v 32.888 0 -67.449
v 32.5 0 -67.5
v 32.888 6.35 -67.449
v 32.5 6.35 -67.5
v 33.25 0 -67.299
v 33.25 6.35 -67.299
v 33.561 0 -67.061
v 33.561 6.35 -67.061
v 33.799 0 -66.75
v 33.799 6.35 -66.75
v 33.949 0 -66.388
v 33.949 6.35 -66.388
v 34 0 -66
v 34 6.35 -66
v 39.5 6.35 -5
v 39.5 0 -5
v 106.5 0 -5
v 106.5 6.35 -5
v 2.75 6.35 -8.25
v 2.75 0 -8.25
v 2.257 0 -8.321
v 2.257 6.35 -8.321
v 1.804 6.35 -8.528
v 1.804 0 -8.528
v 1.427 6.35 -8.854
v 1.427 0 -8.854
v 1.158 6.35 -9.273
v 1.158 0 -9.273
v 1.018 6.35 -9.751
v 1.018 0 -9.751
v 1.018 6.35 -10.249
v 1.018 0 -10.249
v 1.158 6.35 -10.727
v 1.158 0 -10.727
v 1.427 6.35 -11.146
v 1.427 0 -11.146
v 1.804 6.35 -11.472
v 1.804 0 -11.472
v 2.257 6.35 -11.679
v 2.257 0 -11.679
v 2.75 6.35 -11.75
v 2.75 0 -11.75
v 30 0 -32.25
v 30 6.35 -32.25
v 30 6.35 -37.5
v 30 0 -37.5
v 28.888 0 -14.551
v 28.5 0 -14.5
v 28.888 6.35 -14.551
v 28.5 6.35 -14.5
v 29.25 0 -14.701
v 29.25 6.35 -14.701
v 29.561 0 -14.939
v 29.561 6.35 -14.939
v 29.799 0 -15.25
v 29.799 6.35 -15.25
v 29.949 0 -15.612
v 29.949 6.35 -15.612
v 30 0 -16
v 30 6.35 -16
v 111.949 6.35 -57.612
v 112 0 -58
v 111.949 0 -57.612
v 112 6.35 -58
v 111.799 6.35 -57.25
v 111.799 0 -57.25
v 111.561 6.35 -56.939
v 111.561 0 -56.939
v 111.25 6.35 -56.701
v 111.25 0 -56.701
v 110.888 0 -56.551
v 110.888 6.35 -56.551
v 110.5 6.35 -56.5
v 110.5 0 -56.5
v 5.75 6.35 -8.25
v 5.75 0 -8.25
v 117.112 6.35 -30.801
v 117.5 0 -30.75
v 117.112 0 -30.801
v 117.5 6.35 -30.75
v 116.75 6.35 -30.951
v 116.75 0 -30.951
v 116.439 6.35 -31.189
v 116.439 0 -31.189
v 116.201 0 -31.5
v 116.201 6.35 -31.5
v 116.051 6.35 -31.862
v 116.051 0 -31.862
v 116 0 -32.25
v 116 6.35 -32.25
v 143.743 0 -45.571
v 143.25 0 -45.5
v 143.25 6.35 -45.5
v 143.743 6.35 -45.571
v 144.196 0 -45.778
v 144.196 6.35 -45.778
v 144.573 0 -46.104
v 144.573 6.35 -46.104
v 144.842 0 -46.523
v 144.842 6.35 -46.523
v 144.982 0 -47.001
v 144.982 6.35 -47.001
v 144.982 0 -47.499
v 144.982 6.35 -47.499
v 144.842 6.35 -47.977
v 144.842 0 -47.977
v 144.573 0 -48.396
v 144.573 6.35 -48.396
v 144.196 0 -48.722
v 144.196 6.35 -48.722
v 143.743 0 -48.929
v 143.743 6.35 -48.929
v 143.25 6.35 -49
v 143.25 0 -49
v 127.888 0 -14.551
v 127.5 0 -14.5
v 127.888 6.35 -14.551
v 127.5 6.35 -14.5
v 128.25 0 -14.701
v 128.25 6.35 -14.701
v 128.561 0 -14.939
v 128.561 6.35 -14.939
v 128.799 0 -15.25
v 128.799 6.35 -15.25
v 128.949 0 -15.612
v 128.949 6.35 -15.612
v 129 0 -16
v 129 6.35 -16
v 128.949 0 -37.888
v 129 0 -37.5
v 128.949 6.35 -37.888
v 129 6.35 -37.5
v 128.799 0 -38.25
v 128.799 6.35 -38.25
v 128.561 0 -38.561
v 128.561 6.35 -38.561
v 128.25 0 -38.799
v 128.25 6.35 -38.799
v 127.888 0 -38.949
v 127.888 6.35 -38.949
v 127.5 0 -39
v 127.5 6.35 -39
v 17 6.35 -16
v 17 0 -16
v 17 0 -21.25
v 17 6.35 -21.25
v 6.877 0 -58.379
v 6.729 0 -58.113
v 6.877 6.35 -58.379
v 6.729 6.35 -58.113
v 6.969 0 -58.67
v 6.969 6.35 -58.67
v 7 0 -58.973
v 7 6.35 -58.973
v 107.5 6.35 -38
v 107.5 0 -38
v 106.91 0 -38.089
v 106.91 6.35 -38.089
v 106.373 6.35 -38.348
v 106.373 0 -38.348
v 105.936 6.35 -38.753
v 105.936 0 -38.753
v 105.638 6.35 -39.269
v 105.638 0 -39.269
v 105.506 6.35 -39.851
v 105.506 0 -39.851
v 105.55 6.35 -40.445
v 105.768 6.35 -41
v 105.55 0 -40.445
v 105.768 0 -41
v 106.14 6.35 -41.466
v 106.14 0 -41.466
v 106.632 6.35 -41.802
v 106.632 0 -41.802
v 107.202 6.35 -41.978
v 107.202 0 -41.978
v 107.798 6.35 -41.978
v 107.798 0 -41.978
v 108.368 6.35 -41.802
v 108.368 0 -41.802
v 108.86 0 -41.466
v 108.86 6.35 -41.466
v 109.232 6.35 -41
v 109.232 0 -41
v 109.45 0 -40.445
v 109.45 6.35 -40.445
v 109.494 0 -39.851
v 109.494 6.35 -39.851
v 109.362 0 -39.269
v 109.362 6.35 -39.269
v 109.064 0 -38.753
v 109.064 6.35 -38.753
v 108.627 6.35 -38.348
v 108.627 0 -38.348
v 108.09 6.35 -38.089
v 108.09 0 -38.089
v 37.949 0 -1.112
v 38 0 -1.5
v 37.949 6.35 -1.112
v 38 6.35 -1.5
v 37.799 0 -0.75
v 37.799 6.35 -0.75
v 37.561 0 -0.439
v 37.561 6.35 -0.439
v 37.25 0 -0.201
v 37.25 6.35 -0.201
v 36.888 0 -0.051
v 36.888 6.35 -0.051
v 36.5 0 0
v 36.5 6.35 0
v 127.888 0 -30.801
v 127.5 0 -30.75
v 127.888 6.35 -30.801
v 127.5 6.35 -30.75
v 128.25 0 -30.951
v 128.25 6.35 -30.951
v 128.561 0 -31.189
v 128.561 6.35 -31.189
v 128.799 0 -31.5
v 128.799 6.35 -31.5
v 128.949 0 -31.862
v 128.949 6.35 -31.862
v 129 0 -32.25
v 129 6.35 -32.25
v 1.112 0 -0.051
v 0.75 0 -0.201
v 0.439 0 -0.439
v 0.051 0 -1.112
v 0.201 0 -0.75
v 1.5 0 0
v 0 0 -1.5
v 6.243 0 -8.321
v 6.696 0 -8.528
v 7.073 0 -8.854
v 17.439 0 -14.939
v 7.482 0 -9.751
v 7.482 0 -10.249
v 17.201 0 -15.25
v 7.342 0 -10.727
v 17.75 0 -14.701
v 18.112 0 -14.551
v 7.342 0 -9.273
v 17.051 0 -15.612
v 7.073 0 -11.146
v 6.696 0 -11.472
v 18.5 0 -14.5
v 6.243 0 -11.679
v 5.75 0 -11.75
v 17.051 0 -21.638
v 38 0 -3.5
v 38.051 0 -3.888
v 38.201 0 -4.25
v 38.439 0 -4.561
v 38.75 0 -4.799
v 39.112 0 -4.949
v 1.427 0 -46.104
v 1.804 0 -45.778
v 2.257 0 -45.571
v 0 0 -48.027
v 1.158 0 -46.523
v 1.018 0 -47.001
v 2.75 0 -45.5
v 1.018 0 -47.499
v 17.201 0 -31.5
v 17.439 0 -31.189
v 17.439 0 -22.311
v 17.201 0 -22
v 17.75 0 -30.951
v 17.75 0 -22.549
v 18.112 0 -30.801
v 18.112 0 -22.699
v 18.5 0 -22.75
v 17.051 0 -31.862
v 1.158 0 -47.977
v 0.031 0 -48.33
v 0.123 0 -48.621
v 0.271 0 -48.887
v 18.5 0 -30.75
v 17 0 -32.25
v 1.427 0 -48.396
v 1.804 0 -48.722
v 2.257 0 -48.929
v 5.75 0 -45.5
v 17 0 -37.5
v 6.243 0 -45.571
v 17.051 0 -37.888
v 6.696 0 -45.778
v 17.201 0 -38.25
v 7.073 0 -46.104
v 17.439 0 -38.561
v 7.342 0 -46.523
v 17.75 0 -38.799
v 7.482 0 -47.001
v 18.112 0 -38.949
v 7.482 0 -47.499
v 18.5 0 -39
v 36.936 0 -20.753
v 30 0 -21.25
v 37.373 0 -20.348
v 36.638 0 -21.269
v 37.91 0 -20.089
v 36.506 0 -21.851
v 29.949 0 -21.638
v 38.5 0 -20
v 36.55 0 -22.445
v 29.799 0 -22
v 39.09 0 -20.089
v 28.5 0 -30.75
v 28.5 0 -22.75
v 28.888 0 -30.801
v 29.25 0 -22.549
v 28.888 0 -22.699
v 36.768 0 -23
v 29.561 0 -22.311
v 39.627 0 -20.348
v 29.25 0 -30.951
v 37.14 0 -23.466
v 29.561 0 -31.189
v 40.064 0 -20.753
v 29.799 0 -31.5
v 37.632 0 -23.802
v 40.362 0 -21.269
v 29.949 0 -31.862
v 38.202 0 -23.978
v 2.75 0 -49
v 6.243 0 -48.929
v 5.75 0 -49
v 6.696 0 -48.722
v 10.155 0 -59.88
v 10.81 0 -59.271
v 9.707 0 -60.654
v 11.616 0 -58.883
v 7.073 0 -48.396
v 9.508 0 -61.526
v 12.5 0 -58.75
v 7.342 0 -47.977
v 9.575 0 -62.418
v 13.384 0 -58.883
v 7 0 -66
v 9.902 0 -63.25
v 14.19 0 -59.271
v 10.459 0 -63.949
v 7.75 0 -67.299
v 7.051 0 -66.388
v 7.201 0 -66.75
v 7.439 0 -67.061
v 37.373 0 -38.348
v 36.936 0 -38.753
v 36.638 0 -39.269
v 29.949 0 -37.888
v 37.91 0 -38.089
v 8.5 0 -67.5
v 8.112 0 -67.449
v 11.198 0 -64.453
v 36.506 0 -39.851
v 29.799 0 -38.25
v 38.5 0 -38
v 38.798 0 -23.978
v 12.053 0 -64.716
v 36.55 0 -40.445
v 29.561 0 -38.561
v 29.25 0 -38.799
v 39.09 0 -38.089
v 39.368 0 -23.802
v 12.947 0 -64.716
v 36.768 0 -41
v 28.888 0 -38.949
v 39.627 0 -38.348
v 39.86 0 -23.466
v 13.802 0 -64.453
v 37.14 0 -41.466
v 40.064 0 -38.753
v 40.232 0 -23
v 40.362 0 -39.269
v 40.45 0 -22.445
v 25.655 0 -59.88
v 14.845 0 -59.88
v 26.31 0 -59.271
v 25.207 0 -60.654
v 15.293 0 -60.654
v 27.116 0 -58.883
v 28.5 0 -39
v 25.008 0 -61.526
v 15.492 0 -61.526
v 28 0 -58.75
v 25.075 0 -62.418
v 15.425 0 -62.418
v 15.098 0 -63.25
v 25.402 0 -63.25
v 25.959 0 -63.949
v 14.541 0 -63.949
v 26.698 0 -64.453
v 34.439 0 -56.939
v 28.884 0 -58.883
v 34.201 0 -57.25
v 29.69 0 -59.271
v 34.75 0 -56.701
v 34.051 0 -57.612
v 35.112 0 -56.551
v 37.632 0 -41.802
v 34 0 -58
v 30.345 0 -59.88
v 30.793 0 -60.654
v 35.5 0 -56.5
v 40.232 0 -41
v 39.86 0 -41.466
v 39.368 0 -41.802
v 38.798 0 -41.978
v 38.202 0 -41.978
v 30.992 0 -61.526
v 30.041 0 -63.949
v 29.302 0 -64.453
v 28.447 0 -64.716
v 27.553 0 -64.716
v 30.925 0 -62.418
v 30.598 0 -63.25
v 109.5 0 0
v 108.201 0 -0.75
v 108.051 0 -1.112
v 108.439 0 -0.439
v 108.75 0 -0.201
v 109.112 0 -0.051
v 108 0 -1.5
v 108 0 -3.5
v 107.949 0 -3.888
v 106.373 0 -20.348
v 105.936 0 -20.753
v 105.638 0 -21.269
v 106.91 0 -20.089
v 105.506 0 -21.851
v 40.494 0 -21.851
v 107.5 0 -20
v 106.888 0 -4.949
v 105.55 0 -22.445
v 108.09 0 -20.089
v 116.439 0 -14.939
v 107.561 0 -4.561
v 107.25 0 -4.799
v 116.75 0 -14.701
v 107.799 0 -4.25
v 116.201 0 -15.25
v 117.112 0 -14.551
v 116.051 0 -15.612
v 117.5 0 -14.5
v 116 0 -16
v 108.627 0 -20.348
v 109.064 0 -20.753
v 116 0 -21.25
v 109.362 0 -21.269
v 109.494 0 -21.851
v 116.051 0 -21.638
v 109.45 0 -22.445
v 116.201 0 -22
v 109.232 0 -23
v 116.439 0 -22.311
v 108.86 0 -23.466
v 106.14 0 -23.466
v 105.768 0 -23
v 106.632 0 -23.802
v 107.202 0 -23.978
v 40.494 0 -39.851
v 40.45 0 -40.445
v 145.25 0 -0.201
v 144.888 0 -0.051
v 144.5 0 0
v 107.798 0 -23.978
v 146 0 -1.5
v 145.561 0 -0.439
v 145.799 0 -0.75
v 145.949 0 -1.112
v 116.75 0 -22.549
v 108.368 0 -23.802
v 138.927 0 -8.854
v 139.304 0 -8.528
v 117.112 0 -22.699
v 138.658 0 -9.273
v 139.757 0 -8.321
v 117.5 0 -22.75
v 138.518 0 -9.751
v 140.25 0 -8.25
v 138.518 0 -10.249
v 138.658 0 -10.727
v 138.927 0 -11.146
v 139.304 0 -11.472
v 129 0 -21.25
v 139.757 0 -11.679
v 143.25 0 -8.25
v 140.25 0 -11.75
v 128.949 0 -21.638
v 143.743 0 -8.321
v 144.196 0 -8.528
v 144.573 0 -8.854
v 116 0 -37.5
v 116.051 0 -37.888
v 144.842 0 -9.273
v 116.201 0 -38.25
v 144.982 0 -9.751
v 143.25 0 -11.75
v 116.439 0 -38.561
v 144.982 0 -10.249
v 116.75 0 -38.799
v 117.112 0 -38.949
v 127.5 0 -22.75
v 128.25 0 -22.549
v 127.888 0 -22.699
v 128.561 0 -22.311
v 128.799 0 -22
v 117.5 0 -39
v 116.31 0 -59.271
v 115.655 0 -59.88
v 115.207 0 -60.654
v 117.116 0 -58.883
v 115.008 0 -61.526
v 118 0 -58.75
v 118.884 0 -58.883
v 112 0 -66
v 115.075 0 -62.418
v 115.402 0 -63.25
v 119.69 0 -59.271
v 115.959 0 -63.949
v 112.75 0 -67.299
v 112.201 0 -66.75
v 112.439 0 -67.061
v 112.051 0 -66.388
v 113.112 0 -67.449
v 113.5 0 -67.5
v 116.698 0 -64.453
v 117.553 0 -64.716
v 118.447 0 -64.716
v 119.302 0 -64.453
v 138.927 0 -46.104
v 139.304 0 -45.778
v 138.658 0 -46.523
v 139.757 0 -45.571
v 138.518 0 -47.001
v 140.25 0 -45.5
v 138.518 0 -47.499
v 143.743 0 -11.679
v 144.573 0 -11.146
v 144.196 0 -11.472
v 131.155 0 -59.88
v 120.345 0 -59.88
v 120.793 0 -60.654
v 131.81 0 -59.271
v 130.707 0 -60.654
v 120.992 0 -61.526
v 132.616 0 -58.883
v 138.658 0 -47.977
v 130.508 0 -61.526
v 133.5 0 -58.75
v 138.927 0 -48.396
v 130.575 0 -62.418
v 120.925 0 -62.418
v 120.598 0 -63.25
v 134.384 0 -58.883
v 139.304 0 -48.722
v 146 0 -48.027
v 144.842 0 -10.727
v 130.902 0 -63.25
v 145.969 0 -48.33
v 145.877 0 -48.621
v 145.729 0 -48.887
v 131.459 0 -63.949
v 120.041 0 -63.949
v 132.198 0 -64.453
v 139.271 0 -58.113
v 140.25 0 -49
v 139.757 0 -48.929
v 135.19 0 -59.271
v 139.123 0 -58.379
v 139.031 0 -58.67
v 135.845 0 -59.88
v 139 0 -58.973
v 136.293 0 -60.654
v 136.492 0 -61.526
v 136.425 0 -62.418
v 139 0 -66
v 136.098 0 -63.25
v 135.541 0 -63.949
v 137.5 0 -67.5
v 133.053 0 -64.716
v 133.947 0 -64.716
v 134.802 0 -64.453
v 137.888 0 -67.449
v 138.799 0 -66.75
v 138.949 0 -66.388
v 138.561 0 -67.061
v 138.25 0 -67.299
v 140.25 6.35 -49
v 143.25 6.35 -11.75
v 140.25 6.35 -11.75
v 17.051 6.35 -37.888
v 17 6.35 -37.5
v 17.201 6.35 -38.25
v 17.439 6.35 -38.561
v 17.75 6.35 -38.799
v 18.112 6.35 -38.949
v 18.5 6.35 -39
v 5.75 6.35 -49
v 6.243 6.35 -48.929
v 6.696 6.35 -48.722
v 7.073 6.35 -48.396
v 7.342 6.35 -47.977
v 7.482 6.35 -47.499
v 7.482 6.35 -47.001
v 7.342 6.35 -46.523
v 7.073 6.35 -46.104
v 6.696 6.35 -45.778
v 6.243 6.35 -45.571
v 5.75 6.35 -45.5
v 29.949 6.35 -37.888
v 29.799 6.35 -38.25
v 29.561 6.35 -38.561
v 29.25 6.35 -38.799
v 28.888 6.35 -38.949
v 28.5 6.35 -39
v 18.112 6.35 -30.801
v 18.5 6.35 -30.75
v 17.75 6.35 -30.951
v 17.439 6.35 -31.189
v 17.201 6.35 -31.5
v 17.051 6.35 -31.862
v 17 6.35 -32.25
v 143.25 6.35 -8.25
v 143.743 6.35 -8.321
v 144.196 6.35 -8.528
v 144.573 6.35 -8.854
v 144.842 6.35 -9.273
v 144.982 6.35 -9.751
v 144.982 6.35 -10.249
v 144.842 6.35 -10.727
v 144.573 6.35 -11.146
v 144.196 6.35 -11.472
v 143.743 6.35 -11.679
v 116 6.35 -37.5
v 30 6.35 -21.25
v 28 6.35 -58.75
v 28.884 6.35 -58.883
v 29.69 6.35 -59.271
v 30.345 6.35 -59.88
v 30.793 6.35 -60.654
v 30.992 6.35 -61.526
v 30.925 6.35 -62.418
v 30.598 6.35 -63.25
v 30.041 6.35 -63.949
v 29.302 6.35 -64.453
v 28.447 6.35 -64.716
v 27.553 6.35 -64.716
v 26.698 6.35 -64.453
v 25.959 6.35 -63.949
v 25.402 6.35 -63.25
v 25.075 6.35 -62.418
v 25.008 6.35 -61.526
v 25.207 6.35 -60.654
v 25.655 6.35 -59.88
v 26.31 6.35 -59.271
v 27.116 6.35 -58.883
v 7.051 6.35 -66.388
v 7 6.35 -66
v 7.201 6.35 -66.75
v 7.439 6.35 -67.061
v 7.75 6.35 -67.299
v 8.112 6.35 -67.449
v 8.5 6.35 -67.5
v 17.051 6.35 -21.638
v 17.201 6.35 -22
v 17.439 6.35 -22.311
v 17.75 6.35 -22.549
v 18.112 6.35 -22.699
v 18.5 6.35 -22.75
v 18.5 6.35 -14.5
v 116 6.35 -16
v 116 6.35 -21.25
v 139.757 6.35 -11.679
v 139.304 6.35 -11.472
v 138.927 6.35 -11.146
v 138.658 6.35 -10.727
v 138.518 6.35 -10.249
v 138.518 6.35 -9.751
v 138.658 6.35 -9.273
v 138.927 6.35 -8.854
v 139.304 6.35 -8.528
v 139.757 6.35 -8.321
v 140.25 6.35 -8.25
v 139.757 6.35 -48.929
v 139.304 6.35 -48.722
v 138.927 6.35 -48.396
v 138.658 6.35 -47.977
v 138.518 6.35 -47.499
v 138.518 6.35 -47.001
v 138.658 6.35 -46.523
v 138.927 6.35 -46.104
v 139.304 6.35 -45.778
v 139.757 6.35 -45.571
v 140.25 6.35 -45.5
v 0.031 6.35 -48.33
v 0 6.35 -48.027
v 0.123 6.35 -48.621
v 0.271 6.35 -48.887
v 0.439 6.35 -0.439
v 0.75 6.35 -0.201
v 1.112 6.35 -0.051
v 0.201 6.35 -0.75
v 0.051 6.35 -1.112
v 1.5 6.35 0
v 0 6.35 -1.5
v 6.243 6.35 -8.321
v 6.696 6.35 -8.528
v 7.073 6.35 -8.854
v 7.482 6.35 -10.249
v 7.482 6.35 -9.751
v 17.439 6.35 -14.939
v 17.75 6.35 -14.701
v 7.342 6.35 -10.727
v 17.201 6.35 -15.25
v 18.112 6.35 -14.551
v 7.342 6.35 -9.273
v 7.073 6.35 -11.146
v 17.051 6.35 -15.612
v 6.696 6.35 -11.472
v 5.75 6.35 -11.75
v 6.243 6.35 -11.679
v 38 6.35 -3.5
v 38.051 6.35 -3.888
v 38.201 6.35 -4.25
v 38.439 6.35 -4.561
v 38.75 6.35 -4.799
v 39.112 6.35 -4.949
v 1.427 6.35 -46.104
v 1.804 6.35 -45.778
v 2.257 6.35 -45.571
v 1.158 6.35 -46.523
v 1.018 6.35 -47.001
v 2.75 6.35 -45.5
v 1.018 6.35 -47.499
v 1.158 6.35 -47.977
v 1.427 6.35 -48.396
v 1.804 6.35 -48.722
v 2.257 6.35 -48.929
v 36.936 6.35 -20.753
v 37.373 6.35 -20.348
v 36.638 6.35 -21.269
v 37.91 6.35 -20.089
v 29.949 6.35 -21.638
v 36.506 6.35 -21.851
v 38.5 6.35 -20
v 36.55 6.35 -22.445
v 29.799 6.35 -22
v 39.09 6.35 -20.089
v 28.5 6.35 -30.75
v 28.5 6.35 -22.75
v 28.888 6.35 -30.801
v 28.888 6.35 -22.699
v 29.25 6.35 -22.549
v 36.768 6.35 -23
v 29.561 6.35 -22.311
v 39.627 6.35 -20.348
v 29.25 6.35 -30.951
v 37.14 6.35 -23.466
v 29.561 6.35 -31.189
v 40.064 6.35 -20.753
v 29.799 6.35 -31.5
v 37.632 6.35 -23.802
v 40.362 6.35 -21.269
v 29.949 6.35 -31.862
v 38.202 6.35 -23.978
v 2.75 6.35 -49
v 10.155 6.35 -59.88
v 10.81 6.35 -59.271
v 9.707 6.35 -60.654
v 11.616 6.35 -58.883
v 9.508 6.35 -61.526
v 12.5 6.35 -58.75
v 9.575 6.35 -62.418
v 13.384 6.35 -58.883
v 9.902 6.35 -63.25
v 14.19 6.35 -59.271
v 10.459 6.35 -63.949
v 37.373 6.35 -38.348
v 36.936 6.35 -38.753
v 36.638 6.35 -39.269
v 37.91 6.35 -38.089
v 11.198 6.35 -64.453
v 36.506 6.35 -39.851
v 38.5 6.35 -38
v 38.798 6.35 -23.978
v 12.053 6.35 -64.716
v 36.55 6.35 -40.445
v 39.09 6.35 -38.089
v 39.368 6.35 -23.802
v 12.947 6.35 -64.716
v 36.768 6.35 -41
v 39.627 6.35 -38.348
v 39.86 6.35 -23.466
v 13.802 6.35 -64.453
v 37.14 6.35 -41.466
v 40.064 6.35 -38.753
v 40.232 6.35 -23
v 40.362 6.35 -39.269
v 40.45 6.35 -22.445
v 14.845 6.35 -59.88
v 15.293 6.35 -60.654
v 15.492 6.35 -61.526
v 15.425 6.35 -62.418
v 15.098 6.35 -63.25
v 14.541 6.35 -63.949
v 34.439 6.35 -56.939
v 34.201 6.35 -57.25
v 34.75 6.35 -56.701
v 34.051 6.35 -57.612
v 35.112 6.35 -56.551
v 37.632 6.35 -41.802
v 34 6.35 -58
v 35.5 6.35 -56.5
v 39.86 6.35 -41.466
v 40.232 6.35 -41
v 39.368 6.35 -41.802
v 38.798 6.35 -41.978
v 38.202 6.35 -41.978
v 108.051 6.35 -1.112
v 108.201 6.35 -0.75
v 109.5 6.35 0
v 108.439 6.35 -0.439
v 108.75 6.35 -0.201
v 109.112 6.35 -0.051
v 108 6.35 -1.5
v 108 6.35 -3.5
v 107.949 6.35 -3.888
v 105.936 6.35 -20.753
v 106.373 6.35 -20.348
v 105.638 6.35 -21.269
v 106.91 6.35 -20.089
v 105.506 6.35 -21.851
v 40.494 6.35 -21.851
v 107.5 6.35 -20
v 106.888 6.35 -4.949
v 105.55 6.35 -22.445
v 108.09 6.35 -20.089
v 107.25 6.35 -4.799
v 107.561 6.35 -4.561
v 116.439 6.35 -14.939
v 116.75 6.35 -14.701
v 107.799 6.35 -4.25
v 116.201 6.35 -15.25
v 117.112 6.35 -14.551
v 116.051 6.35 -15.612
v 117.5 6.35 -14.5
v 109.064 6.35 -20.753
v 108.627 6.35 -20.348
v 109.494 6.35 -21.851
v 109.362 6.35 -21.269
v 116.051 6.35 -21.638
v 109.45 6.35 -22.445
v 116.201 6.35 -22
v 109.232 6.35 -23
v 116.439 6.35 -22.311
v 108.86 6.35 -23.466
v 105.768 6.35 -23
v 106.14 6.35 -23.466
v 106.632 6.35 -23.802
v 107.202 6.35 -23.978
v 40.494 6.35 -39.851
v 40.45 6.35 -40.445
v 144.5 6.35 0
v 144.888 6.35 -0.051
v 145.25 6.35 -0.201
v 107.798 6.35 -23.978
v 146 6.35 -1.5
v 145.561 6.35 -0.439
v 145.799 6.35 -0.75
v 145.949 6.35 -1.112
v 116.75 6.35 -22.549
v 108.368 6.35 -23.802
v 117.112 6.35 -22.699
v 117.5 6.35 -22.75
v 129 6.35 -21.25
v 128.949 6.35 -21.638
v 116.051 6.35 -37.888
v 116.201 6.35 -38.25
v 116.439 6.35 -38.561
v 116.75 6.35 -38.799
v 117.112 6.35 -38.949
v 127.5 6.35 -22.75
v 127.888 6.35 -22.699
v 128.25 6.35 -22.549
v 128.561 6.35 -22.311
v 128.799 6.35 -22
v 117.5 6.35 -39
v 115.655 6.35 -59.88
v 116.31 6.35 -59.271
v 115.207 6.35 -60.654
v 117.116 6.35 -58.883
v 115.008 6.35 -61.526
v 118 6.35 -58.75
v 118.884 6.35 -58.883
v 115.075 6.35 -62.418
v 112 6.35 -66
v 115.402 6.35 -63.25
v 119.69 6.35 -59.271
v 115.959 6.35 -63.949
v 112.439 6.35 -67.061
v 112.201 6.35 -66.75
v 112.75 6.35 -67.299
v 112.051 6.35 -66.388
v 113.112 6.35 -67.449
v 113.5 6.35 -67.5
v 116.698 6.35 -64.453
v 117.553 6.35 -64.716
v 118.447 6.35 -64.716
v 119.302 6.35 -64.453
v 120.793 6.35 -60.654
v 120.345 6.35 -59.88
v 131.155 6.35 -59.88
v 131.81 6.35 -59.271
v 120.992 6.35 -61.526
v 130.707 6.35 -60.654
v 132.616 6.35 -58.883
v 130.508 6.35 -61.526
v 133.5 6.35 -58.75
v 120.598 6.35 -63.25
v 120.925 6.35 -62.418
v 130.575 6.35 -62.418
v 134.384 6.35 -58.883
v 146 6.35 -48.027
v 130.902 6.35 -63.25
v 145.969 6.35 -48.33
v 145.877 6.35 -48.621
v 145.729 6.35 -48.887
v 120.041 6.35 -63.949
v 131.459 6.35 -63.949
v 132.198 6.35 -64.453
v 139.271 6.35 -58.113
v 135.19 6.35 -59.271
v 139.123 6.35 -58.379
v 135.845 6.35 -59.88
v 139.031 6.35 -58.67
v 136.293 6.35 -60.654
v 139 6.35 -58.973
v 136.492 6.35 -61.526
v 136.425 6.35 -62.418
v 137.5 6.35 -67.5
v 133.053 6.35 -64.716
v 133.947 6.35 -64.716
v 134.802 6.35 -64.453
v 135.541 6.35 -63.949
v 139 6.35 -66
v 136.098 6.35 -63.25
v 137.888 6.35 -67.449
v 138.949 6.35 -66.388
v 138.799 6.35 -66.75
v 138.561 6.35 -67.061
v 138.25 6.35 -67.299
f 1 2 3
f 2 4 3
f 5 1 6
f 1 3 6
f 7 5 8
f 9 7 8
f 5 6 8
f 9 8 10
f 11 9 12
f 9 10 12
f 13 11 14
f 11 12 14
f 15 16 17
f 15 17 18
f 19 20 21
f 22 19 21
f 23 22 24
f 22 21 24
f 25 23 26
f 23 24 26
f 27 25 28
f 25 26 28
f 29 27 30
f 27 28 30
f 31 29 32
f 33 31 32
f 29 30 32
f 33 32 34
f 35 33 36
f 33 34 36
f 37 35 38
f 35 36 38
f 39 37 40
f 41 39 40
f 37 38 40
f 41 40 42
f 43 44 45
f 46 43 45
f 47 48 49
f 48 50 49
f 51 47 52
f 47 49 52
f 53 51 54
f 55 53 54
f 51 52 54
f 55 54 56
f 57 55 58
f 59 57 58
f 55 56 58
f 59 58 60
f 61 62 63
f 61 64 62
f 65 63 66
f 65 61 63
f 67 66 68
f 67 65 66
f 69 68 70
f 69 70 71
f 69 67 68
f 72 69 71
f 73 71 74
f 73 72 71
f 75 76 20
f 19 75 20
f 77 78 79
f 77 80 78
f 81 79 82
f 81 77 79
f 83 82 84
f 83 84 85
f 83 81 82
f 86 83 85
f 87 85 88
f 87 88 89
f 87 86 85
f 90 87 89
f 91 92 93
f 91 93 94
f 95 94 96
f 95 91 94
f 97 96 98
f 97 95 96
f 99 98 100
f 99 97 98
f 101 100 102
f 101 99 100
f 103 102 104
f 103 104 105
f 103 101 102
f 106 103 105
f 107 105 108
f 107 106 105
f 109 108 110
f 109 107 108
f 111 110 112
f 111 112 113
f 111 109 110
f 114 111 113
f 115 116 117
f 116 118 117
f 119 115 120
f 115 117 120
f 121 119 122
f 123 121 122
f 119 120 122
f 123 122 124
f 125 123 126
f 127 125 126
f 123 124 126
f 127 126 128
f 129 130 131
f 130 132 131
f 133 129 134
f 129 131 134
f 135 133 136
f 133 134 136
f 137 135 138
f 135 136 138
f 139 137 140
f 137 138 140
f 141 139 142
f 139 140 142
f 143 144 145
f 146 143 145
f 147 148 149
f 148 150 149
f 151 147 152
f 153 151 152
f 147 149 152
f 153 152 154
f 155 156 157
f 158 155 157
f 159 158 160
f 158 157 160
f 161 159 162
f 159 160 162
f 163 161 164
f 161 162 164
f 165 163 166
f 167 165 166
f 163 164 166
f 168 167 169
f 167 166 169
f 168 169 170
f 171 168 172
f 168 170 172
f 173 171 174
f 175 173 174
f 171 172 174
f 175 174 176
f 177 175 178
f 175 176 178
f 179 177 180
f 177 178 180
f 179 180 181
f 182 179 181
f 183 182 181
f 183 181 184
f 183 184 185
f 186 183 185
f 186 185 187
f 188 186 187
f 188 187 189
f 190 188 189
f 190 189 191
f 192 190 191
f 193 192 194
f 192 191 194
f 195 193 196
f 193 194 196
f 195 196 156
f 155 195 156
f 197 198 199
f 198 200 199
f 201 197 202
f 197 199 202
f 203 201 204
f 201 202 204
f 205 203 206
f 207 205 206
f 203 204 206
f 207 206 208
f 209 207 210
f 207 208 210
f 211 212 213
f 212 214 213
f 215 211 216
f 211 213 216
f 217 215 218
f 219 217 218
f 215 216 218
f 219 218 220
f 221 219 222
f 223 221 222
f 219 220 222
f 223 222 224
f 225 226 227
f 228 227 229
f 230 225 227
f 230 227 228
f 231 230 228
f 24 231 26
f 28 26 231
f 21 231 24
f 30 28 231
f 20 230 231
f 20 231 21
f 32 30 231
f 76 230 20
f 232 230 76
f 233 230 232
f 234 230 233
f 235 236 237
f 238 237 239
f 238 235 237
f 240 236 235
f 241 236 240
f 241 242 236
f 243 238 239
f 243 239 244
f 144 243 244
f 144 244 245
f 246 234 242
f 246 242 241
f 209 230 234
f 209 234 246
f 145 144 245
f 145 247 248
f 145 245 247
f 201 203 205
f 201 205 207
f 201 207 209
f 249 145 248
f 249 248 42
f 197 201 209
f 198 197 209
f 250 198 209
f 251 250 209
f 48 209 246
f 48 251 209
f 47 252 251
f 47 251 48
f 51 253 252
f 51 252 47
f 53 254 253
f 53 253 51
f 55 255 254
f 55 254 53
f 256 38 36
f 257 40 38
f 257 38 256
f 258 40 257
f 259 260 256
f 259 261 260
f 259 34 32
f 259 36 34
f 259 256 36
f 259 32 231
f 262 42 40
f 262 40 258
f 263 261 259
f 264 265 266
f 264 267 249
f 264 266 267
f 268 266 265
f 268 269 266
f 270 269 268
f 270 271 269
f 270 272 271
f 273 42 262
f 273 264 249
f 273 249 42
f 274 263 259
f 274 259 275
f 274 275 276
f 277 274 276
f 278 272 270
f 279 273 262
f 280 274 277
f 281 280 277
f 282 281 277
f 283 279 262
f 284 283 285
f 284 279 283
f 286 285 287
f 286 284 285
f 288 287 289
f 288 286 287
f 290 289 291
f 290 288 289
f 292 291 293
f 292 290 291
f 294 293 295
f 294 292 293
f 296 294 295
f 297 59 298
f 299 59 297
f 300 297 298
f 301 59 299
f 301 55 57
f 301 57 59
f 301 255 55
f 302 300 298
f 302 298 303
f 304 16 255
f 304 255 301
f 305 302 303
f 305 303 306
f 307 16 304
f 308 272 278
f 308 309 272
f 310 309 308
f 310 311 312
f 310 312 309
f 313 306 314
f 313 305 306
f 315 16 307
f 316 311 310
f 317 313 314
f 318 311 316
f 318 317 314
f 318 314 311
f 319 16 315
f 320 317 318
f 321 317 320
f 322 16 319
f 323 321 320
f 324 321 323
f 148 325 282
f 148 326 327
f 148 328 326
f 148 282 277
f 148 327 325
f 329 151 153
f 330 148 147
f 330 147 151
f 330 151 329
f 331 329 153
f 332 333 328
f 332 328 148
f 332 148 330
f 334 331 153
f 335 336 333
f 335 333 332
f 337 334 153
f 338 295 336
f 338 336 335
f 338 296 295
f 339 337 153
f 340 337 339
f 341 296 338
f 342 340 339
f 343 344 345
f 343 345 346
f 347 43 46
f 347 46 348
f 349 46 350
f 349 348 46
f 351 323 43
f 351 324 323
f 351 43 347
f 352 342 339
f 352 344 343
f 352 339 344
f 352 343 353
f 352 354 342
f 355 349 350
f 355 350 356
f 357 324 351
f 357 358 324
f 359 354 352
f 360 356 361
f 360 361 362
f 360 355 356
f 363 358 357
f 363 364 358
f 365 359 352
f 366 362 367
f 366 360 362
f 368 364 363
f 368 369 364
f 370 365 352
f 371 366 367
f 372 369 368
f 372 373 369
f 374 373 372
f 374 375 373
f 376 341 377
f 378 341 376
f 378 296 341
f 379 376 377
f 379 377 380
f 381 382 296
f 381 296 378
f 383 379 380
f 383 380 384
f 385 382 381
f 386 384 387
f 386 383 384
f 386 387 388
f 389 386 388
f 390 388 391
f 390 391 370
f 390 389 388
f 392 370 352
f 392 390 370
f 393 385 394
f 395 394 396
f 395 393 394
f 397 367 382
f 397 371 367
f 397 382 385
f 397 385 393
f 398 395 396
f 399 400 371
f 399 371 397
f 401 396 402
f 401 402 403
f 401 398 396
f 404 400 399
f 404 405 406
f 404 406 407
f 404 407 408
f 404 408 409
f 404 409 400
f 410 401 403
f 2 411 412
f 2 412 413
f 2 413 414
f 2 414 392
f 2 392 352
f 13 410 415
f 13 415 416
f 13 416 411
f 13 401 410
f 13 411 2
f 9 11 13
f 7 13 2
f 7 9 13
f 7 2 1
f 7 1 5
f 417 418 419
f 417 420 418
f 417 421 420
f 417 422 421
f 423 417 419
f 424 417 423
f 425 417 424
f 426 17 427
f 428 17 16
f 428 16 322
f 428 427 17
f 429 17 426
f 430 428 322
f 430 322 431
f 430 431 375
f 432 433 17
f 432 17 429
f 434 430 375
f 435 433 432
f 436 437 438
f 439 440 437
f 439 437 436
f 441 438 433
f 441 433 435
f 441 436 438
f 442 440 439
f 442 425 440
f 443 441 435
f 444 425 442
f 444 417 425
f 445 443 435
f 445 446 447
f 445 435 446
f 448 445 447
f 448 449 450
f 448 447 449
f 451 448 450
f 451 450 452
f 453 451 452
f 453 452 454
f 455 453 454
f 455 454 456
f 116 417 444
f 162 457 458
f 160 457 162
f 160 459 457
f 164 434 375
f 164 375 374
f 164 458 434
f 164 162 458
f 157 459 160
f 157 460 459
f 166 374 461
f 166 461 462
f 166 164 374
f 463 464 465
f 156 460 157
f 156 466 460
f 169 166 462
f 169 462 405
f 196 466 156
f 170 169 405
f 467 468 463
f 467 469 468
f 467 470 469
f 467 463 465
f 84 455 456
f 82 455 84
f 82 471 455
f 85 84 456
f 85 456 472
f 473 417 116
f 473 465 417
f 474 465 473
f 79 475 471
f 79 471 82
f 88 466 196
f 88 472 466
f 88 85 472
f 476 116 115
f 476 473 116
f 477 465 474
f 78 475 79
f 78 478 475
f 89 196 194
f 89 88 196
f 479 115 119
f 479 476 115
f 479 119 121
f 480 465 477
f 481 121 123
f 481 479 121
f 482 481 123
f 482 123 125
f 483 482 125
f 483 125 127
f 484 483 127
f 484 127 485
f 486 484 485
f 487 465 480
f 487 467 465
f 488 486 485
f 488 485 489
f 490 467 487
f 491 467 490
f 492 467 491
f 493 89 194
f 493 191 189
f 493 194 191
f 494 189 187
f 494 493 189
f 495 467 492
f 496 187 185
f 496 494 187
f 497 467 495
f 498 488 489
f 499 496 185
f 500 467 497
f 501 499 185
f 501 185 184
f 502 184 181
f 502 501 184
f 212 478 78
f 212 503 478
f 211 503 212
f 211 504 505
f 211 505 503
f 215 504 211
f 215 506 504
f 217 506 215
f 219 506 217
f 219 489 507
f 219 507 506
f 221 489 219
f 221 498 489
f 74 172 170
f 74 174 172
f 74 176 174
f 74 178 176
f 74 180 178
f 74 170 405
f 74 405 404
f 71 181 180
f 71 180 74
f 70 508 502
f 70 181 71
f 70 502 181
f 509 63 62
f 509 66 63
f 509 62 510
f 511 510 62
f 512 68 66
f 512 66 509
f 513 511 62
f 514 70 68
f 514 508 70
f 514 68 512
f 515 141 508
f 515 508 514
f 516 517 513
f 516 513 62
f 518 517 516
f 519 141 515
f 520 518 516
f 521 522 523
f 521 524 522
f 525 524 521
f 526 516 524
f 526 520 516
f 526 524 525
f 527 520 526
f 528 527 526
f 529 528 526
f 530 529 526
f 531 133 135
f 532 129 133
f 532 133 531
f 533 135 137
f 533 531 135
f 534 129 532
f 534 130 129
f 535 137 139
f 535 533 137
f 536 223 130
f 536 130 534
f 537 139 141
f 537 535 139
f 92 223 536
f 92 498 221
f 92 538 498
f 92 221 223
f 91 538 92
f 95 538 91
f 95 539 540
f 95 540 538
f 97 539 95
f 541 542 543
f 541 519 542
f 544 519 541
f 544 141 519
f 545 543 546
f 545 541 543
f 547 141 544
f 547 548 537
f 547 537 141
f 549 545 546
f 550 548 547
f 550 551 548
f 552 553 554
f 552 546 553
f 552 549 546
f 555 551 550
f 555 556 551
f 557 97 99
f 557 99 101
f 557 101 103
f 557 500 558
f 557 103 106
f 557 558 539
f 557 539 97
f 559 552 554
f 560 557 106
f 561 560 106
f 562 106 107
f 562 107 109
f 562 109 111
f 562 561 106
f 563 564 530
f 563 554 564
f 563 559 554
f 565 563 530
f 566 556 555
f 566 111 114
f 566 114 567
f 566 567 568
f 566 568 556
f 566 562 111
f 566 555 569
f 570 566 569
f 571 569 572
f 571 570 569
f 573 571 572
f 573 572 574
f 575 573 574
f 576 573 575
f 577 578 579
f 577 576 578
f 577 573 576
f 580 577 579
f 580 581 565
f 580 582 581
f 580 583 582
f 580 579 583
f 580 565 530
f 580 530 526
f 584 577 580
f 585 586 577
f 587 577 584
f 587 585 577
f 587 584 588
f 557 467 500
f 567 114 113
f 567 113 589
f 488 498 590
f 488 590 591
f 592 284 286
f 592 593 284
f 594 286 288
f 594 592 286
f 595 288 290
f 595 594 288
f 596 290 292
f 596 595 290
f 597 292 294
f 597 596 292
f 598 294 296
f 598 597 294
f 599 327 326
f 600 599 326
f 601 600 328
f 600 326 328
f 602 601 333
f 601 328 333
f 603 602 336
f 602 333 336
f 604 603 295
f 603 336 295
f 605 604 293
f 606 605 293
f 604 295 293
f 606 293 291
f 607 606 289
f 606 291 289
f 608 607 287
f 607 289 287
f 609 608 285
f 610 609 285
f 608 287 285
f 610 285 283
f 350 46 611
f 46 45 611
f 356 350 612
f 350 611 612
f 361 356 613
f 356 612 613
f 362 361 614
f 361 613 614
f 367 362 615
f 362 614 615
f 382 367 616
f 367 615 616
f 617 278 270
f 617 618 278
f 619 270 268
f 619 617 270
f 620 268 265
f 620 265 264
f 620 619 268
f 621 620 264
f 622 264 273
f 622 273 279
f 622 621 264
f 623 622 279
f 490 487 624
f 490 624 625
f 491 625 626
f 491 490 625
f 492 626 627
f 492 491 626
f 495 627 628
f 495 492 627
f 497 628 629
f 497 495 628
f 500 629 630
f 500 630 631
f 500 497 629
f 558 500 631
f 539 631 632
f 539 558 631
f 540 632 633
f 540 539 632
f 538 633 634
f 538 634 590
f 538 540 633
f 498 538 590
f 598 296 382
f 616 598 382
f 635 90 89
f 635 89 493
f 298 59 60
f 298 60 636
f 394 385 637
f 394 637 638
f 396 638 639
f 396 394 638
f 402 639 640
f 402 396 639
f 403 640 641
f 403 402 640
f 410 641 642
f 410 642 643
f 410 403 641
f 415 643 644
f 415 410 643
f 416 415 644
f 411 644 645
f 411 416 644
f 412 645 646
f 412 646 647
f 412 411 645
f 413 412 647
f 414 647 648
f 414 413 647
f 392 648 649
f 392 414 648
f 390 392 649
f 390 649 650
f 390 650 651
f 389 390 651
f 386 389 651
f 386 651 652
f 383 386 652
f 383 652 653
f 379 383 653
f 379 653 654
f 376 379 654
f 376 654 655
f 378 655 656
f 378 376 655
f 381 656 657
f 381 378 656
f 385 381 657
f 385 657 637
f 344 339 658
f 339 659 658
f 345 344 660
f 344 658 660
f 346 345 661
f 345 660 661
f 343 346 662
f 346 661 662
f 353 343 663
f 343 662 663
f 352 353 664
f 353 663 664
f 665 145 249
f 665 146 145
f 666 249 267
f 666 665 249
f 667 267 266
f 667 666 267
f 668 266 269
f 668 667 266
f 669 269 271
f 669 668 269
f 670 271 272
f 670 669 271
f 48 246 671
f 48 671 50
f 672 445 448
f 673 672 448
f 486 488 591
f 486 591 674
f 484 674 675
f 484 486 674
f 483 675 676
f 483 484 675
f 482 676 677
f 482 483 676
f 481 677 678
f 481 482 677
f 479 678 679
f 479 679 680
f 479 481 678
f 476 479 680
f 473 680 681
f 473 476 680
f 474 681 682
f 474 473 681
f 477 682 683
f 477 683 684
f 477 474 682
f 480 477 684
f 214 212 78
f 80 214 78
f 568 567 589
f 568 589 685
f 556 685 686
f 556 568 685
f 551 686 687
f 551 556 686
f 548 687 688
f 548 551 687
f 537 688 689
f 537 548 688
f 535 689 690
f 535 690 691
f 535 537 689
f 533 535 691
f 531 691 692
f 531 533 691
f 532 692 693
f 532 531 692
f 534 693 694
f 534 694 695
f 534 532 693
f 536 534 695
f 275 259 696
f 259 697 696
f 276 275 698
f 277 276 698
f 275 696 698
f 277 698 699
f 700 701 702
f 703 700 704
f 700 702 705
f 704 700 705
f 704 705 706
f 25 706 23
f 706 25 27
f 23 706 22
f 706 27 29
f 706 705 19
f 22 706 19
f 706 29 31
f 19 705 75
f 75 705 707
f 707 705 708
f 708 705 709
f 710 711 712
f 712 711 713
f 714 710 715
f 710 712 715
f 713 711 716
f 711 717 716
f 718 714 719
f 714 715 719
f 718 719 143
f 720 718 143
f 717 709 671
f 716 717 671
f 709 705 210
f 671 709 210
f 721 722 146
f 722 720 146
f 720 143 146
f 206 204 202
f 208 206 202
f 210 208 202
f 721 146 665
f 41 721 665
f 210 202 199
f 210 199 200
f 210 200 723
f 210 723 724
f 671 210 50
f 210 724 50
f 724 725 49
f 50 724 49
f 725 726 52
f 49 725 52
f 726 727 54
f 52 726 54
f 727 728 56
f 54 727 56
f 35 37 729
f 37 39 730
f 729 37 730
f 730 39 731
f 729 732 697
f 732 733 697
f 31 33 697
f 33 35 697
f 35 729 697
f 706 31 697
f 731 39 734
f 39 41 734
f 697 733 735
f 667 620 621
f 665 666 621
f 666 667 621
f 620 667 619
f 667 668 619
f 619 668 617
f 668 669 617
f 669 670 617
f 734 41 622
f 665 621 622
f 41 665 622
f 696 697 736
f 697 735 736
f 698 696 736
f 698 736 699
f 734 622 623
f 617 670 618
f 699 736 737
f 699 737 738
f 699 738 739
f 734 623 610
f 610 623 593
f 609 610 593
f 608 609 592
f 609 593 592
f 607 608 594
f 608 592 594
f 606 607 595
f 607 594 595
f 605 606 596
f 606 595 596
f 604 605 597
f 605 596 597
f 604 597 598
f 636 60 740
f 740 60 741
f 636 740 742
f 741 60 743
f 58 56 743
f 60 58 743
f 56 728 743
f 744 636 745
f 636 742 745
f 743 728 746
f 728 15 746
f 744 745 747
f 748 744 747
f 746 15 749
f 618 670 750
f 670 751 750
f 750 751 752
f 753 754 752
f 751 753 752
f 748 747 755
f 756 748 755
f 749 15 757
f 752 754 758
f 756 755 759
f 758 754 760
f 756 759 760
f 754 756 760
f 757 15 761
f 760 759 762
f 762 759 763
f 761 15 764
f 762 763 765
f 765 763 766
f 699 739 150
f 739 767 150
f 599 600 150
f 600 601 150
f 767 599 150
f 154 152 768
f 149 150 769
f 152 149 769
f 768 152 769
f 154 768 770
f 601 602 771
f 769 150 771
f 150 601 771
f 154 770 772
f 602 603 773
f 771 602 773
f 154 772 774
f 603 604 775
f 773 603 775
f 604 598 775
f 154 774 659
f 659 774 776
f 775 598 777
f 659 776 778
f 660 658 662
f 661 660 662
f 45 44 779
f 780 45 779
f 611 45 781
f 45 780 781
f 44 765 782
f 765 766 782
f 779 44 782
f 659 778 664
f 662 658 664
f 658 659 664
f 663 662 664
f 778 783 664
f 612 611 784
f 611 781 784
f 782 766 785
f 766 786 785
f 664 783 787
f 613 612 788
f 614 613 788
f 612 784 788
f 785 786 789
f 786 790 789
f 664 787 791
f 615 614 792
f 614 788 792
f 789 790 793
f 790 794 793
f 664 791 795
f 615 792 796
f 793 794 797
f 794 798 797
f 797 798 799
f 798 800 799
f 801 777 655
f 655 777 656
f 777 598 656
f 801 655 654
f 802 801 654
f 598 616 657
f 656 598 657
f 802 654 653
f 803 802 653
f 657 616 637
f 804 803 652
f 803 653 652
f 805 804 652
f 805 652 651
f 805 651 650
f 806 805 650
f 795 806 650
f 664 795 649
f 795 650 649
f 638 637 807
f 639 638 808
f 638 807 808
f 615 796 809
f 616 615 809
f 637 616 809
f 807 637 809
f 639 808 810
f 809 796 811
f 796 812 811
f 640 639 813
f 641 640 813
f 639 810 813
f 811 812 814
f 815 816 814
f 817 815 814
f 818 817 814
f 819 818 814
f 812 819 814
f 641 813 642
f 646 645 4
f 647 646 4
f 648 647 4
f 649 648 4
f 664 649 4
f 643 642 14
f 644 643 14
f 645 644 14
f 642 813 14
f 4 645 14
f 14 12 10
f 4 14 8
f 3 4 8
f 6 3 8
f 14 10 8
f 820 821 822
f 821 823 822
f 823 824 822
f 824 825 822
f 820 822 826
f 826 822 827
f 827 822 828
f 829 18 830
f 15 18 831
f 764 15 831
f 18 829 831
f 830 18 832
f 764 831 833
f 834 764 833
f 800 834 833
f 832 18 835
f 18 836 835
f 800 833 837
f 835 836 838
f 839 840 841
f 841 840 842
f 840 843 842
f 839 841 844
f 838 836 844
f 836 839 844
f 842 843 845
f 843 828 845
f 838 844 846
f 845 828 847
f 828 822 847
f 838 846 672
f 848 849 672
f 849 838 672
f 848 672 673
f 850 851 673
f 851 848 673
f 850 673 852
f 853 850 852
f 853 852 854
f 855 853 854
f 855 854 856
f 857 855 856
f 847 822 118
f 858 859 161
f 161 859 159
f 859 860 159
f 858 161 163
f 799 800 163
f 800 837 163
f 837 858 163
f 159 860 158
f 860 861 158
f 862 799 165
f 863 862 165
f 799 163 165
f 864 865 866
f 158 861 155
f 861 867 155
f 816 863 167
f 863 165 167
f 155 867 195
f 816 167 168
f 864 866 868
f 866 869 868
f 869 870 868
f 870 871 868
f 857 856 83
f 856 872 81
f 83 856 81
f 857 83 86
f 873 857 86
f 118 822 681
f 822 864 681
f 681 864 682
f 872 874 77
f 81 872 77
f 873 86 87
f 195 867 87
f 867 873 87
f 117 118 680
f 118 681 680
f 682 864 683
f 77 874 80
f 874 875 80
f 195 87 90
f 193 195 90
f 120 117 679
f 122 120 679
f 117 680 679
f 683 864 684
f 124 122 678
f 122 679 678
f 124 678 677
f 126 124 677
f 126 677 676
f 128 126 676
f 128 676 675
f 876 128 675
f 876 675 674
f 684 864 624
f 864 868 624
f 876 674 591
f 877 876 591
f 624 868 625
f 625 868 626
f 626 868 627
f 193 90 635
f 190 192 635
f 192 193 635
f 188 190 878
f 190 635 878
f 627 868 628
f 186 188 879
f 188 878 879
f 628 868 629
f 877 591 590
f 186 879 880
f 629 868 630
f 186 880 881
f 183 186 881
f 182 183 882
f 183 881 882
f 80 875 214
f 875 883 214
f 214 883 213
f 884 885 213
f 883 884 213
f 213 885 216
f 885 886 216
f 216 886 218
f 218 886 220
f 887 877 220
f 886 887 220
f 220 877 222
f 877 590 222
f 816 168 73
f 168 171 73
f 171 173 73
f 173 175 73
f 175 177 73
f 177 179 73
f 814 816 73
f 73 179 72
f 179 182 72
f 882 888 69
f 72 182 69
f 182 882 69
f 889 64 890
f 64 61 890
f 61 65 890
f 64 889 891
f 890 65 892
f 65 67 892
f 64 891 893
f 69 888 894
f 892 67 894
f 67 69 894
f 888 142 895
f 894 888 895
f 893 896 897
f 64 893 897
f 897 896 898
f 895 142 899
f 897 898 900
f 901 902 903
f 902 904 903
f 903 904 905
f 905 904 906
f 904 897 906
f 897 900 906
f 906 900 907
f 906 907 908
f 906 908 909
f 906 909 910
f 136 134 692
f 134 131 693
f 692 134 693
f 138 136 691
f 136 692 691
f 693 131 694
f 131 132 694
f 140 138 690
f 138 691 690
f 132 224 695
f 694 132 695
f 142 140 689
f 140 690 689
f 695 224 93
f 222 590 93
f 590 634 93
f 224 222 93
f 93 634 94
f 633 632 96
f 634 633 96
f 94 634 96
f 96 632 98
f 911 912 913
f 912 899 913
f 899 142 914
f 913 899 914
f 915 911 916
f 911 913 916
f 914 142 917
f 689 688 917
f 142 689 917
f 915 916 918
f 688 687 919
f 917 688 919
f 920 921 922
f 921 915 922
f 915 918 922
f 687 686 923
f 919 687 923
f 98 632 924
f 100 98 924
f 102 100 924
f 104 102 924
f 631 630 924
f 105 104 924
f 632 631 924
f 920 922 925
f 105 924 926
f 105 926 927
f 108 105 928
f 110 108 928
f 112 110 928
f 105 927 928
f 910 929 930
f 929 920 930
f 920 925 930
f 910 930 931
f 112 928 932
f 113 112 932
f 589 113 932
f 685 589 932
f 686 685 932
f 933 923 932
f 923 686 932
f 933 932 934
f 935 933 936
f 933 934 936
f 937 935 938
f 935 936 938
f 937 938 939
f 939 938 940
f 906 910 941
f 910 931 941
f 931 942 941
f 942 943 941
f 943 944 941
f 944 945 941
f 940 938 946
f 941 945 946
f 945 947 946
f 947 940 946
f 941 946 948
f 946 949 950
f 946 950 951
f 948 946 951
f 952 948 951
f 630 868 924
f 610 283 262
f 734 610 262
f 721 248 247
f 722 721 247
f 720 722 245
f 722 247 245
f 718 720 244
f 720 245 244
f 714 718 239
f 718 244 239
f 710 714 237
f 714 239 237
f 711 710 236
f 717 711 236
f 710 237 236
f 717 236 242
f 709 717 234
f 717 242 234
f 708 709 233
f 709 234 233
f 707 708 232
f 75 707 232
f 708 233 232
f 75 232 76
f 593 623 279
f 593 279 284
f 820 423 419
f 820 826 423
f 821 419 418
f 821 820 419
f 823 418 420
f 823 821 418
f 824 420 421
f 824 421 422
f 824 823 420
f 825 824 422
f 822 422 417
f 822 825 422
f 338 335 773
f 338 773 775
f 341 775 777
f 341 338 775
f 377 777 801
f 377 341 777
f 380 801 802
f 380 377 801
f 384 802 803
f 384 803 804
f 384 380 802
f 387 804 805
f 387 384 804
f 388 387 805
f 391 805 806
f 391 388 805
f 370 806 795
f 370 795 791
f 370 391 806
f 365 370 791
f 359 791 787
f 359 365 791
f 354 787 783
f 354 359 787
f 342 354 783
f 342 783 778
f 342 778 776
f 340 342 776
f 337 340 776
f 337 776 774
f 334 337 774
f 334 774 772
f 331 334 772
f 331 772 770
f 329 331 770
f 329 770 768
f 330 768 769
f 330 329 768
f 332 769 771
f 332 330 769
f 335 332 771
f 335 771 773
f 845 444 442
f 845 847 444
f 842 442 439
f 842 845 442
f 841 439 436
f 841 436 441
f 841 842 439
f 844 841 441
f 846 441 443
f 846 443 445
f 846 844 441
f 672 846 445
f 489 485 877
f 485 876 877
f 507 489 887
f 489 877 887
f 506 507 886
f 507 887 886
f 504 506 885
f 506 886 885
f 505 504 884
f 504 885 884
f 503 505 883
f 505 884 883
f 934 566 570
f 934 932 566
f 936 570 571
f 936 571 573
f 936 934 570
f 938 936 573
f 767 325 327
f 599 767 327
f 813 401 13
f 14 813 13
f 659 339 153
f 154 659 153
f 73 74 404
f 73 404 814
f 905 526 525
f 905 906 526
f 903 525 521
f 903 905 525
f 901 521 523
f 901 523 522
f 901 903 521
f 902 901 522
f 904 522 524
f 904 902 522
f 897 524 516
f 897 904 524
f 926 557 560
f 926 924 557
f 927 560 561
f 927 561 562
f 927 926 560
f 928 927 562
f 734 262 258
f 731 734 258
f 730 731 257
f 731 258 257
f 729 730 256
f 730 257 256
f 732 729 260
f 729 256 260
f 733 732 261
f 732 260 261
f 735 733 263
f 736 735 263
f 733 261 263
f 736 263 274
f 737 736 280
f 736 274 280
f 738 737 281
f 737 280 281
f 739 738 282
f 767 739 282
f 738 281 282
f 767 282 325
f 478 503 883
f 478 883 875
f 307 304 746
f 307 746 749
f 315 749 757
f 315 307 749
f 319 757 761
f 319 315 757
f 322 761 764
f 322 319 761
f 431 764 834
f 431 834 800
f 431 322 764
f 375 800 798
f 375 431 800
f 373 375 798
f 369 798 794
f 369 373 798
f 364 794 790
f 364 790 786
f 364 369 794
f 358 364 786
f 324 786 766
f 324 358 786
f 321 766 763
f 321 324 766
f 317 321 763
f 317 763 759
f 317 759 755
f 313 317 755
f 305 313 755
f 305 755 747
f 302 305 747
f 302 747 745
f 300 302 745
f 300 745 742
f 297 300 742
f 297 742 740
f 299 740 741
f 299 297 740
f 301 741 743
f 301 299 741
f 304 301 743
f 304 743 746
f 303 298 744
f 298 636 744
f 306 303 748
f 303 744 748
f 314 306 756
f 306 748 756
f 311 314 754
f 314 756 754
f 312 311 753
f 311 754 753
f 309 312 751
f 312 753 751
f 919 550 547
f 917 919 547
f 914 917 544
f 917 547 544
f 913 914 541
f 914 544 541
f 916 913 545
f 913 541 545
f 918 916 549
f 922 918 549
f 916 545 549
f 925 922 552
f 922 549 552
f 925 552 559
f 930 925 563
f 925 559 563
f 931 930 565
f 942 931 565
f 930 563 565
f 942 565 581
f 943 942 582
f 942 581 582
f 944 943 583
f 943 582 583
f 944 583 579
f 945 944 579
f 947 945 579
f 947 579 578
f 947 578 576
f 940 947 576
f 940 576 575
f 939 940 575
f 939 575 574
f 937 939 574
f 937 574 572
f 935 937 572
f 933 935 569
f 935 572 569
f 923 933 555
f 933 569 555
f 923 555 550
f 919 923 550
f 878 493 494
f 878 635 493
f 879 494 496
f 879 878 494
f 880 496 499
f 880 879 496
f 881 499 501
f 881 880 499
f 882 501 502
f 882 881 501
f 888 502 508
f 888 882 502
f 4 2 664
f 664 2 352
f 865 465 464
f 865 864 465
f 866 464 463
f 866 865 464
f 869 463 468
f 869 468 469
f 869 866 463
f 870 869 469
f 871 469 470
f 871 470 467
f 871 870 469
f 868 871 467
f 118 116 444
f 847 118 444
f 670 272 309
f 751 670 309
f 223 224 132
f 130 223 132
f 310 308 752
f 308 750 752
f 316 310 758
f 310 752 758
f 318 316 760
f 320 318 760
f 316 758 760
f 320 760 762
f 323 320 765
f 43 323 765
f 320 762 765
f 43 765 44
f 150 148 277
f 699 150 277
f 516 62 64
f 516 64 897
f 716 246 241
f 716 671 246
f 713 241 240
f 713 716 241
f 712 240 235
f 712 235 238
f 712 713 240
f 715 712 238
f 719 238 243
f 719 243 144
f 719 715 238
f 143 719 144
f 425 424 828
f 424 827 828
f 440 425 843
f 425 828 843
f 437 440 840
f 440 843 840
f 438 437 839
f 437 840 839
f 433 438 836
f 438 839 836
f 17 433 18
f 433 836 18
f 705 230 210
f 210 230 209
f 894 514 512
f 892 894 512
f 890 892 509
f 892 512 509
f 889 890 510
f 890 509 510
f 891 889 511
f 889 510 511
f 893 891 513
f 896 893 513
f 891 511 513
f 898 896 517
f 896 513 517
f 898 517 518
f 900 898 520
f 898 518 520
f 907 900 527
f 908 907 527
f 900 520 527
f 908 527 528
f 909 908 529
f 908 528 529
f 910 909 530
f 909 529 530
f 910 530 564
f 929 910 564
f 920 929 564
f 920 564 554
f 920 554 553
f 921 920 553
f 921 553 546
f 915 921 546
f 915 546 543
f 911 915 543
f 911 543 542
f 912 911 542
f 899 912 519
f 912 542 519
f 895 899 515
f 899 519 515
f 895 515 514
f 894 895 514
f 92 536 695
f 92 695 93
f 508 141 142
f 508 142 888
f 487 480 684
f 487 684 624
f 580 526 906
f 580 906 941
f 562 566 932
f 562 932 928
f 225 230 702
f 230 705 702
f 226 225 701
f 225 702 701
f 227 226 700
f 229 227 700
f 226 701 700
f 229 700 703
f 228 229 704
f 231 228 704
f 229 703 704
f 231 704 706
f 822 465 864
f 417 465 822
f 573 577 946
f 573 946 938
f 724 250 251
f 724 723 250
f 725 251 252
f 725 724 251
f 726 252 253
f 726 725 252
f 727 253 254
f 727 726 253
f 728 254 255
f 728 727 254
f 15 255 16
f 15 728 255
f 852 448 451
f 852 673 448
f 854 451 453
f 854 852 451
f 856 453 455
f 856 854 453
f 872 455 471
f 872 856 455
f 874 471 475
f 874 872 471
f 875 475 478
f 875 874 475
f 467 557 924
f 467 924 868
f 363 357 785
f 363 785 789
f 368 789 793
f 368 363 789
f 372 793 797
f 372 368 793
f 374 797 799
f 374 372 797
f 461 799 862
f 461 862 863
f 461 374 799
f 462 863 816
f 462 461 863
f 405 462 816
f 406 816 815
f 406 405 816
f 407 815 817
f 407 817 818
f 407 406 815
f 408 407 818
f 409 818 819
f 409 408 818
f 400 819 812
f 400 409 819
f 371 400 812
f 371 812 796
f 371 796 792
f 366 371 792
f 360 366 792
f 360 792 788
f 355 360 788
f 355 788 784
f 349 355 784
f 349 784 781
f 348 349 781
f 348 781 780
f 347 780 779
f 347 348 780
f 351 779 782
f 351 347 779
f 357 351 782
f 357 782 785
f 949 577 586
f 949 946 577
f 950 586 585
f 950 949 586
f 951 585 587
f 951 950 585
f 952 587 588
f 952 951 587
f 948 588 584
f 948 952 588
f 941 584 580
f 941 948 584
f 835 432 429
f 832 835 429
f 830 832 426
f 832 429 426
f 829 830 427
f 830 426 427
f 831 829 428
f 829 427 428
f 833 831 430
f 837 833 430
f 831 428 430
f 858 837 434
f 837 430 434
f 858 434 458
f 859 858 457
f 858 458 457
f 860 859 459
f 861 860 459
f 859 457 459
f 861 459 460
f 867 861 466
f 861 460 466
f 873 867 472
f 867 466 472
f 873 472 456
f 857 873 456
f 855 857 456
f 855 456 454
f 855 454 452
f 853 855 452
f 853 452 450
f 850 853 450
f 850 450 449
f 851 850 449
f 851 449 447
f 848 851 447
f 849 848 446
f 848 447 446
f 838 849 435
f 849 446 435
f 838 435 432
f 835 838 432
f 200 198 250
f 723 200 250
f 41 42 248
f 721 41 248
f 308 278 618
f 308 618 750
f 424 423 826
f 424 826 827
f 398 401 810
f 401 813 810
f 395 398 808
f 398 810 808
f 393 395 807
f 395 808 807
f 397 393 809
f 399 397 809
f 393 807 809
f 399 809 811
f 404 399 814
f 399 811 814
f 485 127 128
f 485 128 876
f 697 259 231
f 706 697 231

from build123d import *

# Parameters (mm, degrees)
SKETCH1_R           = 2
SKETCH1_R_2         = 3
SKETCH1_W           = 13
SKETCH1_H           = 8.25
BOSS_EXTRUDE1_DEPTH = 6.35
FILLET1_R           = 1.5
SKETCH2_W           = 82.327825706
SKETCH2_H           = 14.458254131
CUT_EXTRUDE1_DEPTH  = 51
SKETCH3_W           = 51.5
SKETCH3_H           = 6.35
BOSS_EXTRUDE2_DEPTH = 25


with BuildPart() as part:
    # Sketch1 → Boss-Extrude1 (new body)
    with BuildSketch(Plane(origin=(0, 0, 0), x_dir=(1, 0, 0), z_dir=(0, 1, 0))):
        Polygon((38, 0), (38, 5), (58, 5), (58, 0), (96, 0), (96, 48.5), (89, 58.5), (89, 67.5), (62, 67.5), (62, 56.5), (34, 56.5), (34, 67.5), (7, 67.5), (7, 58.5), (0, 48.5), (0, 0), align=None)
        with Locations(Location((38.5, 40, 0), (0, 0, 270))):
            Circle(SKETCH1_R, mode=Mode.SUBTRACT)
        with Locations(Location((38.5, 22, 0), (0, 0, 270))):
            Circle(SKETCH1_R, mode=Mode.SUBTRACT)
        with Locations(Location((57.5, 22, 0), (0, 0, 90))):
            Circle(SKETCH1_R, mode=Mode.SUBTRACT)
        with Locations(Location((57.5, 40, 0), (0, 0, 90))):
            Circle(SKETCH1_R, mode=Mode.SUBTRACT)
        with Locations(Location((12.5, 61.75, 0), (0, 0, 270))):
            Circle(SKETCH1_R_2, mode=Mode.SUBTRACT)
        with Locations(Location((28, 61.75, 0), (0, 0, 270))):
            Circle(SKETCH1_R_2, mode=Mode.SUBTRACT)
        with Locations(Location((68, 61.75, 0), (0, 0, 90))):
            Circle(SKETCH1_R_2, mode=Mode.SUBTRACT)
        with Locations(Location((83.5, 61.75, 0), (0, 0, 90))):
            Circle(SKETCH1_R_2, mode=Mode.SUBTRACT)
        with Locations((72.5, 18.625)):
            Rectangle(SKETCH1_W, SKETCH1_H, mode=Mode.SUBTRACT)
        with Locations((23.5, 34.875)):
            Rectangle(SKETCH1_W, SKETCH1_H, mode=Mode.SUBTRACT)
        with Locations((23.5, 18.625)):
            Rectangle(SKETCH1_W, SKETCH1_H, mode=Mode.SUBTRACT)
        with Locations((72.5, 34.875)):
            Rectangle(SKETCH1_W, SKETCH1_H, mode=Mode.SUBTRACT)
        with BuildLine():
            Line((2.75, 11.75), (5.75, 11.75))
            ThreePointArc((5.75, 11.75), (7.5, 10), (5.75, 8.25))
            Line((5.75, 8.25), (2.75, 8.25))
            ThreePointArc((2.75, 8.25), (1, 10), (2.75, 11.75))
        make_face(mode=Mode.SUBTRACT)
        with BuildLine():
            Line((93.25, 8.25), (90.25, 8.25))
            ThreePointArc((90.25, 8.25), (88.5, 10), (90.25, 11.75))
            Line((90.25, 11.75), (93.25, 11.75))
            ThreePointArc((93.25, 11.75), (95, 10), (93.25, 8.25))
        make_face(mode=Mode.SUBTRACT)
        with BuildLine():
            Line((93.25, 45.5), (90.25, 45.5))
            ThreePointArc((90.25, 45.5), (88.5, 47.25), (90.25, 49))
            Line((90.25, 49), (93.25, 49))
            ThreePointArc((93.25, 49), (95, 47.25), (93.25, 45.5))
        make_face(mode=Mode.SUBTRACT)
        with BuildLine():
            Line((2.75, 49), (5.75, 49))
            ThreePointArc((5.75, 49), (7.5, 47.25), (5.75, 45.5))
            Line((5.75, 45.5), (2.75, 45.5))
            ThreePointArc((2.75, 45.5), (1, 47.25), (2.75, 49))
        make_face(mode=Mode.SUBTRACT)
    extrude(amount=BOSS_EXTRUDE1_DEPTH)

    # Fillet1
    fillet1_edges = [part.edges().sort_by_distance(p)[0] for p in [
        (0, 3.175, -48.5),
        (7, 3.175, -58.5),
        (7, 3.175, -67.5),
        (34, 3.175, -67.5),
        (34, 3.175, -56.5),
        (62, 3.175, -56.5),
        (62, 3.175, -67.5),
        (89, 3.175, -67.5),
        (89, 3.175, -58.5),
        (96, 3.175, -48.5),
        (96, 3.175, 0),
        (58, 3.175, 0),
        (58, 3.175, -5),
        (38, 3.175, -5),
        (38, 3.175, 0),
        (0, 3.175, 0),
        (17, 3.175, -39),
        (17, 3.175, -30.75),
        (30, 3.175, -30.75),
        (30, 3.175, -39),
        (17, 3.175, -22.75),
        (17, 3.175, -14.5),
        (30, 3.175, -14.5),
        (30, 3.175, -22.75),
        (79, 3.175, -14.5),
        (79, 3.175, -22.75),
        (66, 3.175, -22.75),
        (66, 3.175, -14.5),
        (79, 3.175, -30.75),
        (79, 3.175, -39),
        (66, 3.175, -39),
        (66, 3.175, -30.75),
    ]]
    fillet(fillet1_edges, radius=FILLET1_R)

    # Sketch2 → Cut-Extrude1 (cut)
    with BuildSketch(Plane(origin=(48, 0, 0), x_dir=(0, 0, -1), z_dir=(1, 0, 0))):
        with Locations((33.293792952, 1.315835649)):
            Rectangle(SKETCH2_W, SKETCH2_H)
    extrude(amount=CUT_EXTRUDE1_DEPTH, mode=Mode.SUBTRACT)

    # Sketch3 → Boss-Extrude2 (add)
    with BuildSketch(Plane(origin=(48, 0, 0), x_dir=(0, 0, -1), z_dir=(1, 0, 0))):
        with Locations((30.75, 3.175)):
            Rectangle(SKETCH3_W, SKETCH3_H)
    extrude(amount=BOSS_EXTRUDE2_DEPTH)

    # Mirror1: part across plane


with BuildPart() as part_1:
    add(part.part)
    add(part.part.mirror(Plane(origin=(73, 0, 0), x_dir=(0, 0, 1), z_dir=(1, 0, 0))))


solid = part_1.part
